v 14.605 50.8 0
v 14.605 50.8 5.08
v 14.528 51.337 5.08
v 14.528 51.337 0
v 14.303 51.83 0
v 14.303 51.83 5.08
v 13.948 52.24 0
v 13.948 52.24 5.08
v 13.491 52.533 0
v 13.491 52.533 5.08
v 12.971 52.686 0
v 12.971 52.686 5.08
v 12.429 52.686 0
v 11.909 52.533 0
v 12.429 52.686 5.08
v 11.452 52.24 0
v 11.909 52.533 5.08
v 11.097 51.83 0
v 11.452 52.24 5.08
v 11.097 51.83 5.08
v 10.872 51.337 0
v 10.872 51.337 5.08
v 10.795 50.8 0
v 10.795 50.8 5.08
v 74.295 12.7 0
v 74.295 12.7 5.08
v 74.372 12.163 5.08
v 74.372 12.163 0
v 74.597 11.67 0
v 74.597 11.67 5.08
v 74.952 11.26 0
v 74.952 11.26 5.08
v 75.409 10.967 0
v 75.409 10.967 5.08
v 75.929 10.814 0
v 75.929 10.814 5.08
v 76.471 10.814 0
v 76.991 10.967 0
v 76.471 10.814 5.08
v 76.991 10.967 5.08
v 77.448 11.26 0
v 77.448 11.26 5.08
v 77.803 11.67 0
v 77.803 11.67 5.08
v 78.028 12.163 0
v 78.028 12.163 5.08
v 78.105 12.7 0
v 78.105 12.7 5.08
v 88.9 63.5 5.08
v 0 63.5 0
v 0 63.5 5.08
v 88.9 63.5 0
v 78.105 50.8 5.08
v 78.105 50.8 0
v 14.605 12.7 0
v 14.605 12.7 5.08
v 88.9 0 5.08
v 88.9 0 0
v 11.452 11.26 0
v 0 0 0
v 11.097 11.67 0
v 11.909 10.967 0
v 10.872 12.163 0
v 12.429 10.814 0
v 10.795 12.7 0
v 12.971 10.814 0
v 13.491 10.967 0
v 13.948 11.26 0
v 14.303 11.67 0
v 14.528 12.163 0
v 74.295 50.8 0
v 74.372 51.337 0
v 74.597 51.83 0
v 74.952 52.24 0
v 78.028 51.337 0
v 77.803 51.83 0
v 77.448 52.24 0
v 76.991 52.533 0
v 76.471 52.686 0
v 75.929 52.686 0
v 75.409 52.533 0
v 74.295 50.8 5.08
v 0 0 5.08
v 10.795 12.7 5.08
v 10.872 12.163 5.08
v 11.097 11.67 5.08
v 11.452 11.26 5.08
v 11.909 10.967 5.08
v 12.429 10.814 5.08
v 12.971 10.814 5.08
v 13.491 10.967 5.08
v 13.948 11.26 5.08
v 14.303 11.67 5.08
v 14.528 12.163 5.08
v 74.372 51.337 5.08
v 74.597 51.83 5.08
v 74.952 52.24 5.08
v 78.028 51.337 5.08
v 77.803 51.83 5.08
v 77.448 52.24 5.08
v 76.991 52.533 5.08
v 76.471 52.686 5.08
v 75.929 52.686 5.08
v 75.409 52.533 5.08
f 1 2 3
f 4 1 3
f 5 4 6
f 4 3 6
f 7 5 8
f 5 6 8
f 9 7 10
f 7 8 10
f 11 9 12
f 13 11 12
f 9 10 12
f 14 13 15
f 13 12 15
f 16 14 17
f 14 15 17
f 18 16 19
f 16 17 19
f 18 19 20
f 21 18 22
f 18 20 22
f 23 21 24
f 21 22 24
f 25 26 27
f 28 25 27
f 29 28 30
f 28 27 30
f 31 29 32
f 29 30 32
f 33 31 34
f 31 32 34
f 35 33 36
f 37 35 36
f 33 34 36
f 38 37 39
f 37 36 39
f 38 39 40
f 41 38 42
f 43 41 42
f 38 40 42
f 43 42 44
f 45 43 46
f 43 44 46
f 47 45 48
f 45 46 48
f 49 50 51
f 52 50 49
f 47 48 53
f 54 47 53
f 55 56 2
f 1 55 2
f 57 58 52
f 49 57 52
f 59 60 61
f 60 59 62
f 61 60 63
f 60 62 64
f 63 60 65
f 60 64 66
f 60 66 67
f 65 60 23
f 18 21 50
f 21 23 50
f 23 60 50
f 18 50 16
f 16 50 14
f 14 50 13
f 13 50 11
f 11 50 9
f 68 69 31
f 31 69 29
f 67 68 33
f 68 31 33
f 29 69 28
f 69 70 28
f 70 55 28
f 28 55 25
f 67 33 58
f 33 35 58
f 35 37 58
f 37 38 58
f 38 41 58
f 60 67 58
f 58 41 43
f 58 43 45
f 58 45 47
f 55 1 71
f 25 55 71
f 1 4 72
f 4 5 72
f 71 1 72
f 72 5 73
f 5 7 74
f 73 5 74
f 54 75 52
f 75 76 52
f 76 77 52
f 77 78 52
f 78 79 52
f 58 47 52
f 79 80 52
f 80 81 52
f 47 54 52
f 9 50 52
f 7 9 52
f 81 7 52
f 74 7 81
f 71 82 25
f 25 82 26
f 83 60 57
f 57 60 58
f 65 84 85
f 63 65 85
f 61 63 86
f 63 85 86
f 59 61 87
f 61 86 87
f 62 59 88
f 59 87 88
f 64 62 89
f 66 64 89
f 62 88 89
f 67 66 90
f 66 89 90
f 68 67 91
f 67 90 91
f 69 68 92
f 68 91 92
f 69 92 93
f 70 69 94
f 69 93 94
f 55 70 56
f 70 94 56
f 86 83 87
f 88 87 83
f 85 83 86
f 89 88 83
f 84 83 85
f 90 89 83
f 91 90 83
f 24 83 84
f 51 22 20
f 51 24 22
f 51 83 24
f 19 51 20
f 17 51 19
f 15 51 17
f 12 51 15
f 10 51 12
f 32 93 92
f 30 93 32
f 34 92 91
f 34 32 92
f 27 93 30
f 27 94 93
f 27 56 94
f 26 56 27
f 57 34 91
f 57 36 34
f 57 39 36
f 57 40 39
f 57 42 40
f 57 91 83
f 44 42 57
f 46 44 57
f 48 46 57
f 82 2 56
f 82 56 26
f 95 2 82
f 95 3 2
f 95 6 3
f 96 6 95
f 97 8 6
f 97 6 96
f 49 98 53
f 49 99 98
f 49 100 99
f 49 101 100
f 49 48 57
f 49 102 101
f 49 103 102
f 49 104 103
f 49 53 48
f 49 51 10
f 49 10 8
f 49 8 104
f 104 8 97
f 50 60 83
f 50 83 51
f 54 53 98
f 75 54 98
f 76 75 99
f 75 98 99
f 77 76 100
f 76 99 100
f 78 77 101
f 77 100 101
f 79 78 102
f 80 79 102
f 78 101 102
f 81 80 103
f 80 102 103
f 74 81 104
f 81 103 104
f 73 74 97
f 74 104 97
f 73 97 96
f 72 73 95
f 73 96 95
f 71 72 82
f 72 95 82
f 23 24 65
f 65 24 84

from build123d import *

# Parameters (mm, degrees)
F0_W     = 88.9
F0_H     = 63.5
F1_DEPTH = 5.08
F3_DEPTH = 5.081


with BuildPart() as f1:
    # F0 (on Top) → F1 (new body)
    with BuildSketch(Plane.XY):
        with Locations((44.45, 31.75)):
            Rectangle(F0_W, F0_H)
    extrude(amount=F1_DEPTH)

    # F2 (on face) → F3 (cut, through all)
    with BuildSketch(Plane.XY.offset(5.08)):
        with BuildLine():
            ThreePointArc((14.605, 50.8), (12.7, 52.705), (10.795, 50.8))
            Line((10.795, 50.8), (10.795, 12.7))
            ThreePointArc((10.795, 12.7), (12.7, 10.795), (14.605, 12.7))
            Line((14.605, 12.7), (14.605, 50.8))
        make_face()
        with BuildLine():
            ThreePointArc((78.105, 50.8), (76.2, 52.705), (74.295, 50.8))
            Line((74.295, 50.8), (74.295, 12.7))
            ThreePointArc((74.295, 12.7), (76.2, 10.795), (78.105, 12.7))
            Line((78.105, 12.7), (78.105, 50.8))
        make_face()
    extrude(amount=-F3_DEPTH, mode=Mode.SUBTRACT)


solid = f1.part
